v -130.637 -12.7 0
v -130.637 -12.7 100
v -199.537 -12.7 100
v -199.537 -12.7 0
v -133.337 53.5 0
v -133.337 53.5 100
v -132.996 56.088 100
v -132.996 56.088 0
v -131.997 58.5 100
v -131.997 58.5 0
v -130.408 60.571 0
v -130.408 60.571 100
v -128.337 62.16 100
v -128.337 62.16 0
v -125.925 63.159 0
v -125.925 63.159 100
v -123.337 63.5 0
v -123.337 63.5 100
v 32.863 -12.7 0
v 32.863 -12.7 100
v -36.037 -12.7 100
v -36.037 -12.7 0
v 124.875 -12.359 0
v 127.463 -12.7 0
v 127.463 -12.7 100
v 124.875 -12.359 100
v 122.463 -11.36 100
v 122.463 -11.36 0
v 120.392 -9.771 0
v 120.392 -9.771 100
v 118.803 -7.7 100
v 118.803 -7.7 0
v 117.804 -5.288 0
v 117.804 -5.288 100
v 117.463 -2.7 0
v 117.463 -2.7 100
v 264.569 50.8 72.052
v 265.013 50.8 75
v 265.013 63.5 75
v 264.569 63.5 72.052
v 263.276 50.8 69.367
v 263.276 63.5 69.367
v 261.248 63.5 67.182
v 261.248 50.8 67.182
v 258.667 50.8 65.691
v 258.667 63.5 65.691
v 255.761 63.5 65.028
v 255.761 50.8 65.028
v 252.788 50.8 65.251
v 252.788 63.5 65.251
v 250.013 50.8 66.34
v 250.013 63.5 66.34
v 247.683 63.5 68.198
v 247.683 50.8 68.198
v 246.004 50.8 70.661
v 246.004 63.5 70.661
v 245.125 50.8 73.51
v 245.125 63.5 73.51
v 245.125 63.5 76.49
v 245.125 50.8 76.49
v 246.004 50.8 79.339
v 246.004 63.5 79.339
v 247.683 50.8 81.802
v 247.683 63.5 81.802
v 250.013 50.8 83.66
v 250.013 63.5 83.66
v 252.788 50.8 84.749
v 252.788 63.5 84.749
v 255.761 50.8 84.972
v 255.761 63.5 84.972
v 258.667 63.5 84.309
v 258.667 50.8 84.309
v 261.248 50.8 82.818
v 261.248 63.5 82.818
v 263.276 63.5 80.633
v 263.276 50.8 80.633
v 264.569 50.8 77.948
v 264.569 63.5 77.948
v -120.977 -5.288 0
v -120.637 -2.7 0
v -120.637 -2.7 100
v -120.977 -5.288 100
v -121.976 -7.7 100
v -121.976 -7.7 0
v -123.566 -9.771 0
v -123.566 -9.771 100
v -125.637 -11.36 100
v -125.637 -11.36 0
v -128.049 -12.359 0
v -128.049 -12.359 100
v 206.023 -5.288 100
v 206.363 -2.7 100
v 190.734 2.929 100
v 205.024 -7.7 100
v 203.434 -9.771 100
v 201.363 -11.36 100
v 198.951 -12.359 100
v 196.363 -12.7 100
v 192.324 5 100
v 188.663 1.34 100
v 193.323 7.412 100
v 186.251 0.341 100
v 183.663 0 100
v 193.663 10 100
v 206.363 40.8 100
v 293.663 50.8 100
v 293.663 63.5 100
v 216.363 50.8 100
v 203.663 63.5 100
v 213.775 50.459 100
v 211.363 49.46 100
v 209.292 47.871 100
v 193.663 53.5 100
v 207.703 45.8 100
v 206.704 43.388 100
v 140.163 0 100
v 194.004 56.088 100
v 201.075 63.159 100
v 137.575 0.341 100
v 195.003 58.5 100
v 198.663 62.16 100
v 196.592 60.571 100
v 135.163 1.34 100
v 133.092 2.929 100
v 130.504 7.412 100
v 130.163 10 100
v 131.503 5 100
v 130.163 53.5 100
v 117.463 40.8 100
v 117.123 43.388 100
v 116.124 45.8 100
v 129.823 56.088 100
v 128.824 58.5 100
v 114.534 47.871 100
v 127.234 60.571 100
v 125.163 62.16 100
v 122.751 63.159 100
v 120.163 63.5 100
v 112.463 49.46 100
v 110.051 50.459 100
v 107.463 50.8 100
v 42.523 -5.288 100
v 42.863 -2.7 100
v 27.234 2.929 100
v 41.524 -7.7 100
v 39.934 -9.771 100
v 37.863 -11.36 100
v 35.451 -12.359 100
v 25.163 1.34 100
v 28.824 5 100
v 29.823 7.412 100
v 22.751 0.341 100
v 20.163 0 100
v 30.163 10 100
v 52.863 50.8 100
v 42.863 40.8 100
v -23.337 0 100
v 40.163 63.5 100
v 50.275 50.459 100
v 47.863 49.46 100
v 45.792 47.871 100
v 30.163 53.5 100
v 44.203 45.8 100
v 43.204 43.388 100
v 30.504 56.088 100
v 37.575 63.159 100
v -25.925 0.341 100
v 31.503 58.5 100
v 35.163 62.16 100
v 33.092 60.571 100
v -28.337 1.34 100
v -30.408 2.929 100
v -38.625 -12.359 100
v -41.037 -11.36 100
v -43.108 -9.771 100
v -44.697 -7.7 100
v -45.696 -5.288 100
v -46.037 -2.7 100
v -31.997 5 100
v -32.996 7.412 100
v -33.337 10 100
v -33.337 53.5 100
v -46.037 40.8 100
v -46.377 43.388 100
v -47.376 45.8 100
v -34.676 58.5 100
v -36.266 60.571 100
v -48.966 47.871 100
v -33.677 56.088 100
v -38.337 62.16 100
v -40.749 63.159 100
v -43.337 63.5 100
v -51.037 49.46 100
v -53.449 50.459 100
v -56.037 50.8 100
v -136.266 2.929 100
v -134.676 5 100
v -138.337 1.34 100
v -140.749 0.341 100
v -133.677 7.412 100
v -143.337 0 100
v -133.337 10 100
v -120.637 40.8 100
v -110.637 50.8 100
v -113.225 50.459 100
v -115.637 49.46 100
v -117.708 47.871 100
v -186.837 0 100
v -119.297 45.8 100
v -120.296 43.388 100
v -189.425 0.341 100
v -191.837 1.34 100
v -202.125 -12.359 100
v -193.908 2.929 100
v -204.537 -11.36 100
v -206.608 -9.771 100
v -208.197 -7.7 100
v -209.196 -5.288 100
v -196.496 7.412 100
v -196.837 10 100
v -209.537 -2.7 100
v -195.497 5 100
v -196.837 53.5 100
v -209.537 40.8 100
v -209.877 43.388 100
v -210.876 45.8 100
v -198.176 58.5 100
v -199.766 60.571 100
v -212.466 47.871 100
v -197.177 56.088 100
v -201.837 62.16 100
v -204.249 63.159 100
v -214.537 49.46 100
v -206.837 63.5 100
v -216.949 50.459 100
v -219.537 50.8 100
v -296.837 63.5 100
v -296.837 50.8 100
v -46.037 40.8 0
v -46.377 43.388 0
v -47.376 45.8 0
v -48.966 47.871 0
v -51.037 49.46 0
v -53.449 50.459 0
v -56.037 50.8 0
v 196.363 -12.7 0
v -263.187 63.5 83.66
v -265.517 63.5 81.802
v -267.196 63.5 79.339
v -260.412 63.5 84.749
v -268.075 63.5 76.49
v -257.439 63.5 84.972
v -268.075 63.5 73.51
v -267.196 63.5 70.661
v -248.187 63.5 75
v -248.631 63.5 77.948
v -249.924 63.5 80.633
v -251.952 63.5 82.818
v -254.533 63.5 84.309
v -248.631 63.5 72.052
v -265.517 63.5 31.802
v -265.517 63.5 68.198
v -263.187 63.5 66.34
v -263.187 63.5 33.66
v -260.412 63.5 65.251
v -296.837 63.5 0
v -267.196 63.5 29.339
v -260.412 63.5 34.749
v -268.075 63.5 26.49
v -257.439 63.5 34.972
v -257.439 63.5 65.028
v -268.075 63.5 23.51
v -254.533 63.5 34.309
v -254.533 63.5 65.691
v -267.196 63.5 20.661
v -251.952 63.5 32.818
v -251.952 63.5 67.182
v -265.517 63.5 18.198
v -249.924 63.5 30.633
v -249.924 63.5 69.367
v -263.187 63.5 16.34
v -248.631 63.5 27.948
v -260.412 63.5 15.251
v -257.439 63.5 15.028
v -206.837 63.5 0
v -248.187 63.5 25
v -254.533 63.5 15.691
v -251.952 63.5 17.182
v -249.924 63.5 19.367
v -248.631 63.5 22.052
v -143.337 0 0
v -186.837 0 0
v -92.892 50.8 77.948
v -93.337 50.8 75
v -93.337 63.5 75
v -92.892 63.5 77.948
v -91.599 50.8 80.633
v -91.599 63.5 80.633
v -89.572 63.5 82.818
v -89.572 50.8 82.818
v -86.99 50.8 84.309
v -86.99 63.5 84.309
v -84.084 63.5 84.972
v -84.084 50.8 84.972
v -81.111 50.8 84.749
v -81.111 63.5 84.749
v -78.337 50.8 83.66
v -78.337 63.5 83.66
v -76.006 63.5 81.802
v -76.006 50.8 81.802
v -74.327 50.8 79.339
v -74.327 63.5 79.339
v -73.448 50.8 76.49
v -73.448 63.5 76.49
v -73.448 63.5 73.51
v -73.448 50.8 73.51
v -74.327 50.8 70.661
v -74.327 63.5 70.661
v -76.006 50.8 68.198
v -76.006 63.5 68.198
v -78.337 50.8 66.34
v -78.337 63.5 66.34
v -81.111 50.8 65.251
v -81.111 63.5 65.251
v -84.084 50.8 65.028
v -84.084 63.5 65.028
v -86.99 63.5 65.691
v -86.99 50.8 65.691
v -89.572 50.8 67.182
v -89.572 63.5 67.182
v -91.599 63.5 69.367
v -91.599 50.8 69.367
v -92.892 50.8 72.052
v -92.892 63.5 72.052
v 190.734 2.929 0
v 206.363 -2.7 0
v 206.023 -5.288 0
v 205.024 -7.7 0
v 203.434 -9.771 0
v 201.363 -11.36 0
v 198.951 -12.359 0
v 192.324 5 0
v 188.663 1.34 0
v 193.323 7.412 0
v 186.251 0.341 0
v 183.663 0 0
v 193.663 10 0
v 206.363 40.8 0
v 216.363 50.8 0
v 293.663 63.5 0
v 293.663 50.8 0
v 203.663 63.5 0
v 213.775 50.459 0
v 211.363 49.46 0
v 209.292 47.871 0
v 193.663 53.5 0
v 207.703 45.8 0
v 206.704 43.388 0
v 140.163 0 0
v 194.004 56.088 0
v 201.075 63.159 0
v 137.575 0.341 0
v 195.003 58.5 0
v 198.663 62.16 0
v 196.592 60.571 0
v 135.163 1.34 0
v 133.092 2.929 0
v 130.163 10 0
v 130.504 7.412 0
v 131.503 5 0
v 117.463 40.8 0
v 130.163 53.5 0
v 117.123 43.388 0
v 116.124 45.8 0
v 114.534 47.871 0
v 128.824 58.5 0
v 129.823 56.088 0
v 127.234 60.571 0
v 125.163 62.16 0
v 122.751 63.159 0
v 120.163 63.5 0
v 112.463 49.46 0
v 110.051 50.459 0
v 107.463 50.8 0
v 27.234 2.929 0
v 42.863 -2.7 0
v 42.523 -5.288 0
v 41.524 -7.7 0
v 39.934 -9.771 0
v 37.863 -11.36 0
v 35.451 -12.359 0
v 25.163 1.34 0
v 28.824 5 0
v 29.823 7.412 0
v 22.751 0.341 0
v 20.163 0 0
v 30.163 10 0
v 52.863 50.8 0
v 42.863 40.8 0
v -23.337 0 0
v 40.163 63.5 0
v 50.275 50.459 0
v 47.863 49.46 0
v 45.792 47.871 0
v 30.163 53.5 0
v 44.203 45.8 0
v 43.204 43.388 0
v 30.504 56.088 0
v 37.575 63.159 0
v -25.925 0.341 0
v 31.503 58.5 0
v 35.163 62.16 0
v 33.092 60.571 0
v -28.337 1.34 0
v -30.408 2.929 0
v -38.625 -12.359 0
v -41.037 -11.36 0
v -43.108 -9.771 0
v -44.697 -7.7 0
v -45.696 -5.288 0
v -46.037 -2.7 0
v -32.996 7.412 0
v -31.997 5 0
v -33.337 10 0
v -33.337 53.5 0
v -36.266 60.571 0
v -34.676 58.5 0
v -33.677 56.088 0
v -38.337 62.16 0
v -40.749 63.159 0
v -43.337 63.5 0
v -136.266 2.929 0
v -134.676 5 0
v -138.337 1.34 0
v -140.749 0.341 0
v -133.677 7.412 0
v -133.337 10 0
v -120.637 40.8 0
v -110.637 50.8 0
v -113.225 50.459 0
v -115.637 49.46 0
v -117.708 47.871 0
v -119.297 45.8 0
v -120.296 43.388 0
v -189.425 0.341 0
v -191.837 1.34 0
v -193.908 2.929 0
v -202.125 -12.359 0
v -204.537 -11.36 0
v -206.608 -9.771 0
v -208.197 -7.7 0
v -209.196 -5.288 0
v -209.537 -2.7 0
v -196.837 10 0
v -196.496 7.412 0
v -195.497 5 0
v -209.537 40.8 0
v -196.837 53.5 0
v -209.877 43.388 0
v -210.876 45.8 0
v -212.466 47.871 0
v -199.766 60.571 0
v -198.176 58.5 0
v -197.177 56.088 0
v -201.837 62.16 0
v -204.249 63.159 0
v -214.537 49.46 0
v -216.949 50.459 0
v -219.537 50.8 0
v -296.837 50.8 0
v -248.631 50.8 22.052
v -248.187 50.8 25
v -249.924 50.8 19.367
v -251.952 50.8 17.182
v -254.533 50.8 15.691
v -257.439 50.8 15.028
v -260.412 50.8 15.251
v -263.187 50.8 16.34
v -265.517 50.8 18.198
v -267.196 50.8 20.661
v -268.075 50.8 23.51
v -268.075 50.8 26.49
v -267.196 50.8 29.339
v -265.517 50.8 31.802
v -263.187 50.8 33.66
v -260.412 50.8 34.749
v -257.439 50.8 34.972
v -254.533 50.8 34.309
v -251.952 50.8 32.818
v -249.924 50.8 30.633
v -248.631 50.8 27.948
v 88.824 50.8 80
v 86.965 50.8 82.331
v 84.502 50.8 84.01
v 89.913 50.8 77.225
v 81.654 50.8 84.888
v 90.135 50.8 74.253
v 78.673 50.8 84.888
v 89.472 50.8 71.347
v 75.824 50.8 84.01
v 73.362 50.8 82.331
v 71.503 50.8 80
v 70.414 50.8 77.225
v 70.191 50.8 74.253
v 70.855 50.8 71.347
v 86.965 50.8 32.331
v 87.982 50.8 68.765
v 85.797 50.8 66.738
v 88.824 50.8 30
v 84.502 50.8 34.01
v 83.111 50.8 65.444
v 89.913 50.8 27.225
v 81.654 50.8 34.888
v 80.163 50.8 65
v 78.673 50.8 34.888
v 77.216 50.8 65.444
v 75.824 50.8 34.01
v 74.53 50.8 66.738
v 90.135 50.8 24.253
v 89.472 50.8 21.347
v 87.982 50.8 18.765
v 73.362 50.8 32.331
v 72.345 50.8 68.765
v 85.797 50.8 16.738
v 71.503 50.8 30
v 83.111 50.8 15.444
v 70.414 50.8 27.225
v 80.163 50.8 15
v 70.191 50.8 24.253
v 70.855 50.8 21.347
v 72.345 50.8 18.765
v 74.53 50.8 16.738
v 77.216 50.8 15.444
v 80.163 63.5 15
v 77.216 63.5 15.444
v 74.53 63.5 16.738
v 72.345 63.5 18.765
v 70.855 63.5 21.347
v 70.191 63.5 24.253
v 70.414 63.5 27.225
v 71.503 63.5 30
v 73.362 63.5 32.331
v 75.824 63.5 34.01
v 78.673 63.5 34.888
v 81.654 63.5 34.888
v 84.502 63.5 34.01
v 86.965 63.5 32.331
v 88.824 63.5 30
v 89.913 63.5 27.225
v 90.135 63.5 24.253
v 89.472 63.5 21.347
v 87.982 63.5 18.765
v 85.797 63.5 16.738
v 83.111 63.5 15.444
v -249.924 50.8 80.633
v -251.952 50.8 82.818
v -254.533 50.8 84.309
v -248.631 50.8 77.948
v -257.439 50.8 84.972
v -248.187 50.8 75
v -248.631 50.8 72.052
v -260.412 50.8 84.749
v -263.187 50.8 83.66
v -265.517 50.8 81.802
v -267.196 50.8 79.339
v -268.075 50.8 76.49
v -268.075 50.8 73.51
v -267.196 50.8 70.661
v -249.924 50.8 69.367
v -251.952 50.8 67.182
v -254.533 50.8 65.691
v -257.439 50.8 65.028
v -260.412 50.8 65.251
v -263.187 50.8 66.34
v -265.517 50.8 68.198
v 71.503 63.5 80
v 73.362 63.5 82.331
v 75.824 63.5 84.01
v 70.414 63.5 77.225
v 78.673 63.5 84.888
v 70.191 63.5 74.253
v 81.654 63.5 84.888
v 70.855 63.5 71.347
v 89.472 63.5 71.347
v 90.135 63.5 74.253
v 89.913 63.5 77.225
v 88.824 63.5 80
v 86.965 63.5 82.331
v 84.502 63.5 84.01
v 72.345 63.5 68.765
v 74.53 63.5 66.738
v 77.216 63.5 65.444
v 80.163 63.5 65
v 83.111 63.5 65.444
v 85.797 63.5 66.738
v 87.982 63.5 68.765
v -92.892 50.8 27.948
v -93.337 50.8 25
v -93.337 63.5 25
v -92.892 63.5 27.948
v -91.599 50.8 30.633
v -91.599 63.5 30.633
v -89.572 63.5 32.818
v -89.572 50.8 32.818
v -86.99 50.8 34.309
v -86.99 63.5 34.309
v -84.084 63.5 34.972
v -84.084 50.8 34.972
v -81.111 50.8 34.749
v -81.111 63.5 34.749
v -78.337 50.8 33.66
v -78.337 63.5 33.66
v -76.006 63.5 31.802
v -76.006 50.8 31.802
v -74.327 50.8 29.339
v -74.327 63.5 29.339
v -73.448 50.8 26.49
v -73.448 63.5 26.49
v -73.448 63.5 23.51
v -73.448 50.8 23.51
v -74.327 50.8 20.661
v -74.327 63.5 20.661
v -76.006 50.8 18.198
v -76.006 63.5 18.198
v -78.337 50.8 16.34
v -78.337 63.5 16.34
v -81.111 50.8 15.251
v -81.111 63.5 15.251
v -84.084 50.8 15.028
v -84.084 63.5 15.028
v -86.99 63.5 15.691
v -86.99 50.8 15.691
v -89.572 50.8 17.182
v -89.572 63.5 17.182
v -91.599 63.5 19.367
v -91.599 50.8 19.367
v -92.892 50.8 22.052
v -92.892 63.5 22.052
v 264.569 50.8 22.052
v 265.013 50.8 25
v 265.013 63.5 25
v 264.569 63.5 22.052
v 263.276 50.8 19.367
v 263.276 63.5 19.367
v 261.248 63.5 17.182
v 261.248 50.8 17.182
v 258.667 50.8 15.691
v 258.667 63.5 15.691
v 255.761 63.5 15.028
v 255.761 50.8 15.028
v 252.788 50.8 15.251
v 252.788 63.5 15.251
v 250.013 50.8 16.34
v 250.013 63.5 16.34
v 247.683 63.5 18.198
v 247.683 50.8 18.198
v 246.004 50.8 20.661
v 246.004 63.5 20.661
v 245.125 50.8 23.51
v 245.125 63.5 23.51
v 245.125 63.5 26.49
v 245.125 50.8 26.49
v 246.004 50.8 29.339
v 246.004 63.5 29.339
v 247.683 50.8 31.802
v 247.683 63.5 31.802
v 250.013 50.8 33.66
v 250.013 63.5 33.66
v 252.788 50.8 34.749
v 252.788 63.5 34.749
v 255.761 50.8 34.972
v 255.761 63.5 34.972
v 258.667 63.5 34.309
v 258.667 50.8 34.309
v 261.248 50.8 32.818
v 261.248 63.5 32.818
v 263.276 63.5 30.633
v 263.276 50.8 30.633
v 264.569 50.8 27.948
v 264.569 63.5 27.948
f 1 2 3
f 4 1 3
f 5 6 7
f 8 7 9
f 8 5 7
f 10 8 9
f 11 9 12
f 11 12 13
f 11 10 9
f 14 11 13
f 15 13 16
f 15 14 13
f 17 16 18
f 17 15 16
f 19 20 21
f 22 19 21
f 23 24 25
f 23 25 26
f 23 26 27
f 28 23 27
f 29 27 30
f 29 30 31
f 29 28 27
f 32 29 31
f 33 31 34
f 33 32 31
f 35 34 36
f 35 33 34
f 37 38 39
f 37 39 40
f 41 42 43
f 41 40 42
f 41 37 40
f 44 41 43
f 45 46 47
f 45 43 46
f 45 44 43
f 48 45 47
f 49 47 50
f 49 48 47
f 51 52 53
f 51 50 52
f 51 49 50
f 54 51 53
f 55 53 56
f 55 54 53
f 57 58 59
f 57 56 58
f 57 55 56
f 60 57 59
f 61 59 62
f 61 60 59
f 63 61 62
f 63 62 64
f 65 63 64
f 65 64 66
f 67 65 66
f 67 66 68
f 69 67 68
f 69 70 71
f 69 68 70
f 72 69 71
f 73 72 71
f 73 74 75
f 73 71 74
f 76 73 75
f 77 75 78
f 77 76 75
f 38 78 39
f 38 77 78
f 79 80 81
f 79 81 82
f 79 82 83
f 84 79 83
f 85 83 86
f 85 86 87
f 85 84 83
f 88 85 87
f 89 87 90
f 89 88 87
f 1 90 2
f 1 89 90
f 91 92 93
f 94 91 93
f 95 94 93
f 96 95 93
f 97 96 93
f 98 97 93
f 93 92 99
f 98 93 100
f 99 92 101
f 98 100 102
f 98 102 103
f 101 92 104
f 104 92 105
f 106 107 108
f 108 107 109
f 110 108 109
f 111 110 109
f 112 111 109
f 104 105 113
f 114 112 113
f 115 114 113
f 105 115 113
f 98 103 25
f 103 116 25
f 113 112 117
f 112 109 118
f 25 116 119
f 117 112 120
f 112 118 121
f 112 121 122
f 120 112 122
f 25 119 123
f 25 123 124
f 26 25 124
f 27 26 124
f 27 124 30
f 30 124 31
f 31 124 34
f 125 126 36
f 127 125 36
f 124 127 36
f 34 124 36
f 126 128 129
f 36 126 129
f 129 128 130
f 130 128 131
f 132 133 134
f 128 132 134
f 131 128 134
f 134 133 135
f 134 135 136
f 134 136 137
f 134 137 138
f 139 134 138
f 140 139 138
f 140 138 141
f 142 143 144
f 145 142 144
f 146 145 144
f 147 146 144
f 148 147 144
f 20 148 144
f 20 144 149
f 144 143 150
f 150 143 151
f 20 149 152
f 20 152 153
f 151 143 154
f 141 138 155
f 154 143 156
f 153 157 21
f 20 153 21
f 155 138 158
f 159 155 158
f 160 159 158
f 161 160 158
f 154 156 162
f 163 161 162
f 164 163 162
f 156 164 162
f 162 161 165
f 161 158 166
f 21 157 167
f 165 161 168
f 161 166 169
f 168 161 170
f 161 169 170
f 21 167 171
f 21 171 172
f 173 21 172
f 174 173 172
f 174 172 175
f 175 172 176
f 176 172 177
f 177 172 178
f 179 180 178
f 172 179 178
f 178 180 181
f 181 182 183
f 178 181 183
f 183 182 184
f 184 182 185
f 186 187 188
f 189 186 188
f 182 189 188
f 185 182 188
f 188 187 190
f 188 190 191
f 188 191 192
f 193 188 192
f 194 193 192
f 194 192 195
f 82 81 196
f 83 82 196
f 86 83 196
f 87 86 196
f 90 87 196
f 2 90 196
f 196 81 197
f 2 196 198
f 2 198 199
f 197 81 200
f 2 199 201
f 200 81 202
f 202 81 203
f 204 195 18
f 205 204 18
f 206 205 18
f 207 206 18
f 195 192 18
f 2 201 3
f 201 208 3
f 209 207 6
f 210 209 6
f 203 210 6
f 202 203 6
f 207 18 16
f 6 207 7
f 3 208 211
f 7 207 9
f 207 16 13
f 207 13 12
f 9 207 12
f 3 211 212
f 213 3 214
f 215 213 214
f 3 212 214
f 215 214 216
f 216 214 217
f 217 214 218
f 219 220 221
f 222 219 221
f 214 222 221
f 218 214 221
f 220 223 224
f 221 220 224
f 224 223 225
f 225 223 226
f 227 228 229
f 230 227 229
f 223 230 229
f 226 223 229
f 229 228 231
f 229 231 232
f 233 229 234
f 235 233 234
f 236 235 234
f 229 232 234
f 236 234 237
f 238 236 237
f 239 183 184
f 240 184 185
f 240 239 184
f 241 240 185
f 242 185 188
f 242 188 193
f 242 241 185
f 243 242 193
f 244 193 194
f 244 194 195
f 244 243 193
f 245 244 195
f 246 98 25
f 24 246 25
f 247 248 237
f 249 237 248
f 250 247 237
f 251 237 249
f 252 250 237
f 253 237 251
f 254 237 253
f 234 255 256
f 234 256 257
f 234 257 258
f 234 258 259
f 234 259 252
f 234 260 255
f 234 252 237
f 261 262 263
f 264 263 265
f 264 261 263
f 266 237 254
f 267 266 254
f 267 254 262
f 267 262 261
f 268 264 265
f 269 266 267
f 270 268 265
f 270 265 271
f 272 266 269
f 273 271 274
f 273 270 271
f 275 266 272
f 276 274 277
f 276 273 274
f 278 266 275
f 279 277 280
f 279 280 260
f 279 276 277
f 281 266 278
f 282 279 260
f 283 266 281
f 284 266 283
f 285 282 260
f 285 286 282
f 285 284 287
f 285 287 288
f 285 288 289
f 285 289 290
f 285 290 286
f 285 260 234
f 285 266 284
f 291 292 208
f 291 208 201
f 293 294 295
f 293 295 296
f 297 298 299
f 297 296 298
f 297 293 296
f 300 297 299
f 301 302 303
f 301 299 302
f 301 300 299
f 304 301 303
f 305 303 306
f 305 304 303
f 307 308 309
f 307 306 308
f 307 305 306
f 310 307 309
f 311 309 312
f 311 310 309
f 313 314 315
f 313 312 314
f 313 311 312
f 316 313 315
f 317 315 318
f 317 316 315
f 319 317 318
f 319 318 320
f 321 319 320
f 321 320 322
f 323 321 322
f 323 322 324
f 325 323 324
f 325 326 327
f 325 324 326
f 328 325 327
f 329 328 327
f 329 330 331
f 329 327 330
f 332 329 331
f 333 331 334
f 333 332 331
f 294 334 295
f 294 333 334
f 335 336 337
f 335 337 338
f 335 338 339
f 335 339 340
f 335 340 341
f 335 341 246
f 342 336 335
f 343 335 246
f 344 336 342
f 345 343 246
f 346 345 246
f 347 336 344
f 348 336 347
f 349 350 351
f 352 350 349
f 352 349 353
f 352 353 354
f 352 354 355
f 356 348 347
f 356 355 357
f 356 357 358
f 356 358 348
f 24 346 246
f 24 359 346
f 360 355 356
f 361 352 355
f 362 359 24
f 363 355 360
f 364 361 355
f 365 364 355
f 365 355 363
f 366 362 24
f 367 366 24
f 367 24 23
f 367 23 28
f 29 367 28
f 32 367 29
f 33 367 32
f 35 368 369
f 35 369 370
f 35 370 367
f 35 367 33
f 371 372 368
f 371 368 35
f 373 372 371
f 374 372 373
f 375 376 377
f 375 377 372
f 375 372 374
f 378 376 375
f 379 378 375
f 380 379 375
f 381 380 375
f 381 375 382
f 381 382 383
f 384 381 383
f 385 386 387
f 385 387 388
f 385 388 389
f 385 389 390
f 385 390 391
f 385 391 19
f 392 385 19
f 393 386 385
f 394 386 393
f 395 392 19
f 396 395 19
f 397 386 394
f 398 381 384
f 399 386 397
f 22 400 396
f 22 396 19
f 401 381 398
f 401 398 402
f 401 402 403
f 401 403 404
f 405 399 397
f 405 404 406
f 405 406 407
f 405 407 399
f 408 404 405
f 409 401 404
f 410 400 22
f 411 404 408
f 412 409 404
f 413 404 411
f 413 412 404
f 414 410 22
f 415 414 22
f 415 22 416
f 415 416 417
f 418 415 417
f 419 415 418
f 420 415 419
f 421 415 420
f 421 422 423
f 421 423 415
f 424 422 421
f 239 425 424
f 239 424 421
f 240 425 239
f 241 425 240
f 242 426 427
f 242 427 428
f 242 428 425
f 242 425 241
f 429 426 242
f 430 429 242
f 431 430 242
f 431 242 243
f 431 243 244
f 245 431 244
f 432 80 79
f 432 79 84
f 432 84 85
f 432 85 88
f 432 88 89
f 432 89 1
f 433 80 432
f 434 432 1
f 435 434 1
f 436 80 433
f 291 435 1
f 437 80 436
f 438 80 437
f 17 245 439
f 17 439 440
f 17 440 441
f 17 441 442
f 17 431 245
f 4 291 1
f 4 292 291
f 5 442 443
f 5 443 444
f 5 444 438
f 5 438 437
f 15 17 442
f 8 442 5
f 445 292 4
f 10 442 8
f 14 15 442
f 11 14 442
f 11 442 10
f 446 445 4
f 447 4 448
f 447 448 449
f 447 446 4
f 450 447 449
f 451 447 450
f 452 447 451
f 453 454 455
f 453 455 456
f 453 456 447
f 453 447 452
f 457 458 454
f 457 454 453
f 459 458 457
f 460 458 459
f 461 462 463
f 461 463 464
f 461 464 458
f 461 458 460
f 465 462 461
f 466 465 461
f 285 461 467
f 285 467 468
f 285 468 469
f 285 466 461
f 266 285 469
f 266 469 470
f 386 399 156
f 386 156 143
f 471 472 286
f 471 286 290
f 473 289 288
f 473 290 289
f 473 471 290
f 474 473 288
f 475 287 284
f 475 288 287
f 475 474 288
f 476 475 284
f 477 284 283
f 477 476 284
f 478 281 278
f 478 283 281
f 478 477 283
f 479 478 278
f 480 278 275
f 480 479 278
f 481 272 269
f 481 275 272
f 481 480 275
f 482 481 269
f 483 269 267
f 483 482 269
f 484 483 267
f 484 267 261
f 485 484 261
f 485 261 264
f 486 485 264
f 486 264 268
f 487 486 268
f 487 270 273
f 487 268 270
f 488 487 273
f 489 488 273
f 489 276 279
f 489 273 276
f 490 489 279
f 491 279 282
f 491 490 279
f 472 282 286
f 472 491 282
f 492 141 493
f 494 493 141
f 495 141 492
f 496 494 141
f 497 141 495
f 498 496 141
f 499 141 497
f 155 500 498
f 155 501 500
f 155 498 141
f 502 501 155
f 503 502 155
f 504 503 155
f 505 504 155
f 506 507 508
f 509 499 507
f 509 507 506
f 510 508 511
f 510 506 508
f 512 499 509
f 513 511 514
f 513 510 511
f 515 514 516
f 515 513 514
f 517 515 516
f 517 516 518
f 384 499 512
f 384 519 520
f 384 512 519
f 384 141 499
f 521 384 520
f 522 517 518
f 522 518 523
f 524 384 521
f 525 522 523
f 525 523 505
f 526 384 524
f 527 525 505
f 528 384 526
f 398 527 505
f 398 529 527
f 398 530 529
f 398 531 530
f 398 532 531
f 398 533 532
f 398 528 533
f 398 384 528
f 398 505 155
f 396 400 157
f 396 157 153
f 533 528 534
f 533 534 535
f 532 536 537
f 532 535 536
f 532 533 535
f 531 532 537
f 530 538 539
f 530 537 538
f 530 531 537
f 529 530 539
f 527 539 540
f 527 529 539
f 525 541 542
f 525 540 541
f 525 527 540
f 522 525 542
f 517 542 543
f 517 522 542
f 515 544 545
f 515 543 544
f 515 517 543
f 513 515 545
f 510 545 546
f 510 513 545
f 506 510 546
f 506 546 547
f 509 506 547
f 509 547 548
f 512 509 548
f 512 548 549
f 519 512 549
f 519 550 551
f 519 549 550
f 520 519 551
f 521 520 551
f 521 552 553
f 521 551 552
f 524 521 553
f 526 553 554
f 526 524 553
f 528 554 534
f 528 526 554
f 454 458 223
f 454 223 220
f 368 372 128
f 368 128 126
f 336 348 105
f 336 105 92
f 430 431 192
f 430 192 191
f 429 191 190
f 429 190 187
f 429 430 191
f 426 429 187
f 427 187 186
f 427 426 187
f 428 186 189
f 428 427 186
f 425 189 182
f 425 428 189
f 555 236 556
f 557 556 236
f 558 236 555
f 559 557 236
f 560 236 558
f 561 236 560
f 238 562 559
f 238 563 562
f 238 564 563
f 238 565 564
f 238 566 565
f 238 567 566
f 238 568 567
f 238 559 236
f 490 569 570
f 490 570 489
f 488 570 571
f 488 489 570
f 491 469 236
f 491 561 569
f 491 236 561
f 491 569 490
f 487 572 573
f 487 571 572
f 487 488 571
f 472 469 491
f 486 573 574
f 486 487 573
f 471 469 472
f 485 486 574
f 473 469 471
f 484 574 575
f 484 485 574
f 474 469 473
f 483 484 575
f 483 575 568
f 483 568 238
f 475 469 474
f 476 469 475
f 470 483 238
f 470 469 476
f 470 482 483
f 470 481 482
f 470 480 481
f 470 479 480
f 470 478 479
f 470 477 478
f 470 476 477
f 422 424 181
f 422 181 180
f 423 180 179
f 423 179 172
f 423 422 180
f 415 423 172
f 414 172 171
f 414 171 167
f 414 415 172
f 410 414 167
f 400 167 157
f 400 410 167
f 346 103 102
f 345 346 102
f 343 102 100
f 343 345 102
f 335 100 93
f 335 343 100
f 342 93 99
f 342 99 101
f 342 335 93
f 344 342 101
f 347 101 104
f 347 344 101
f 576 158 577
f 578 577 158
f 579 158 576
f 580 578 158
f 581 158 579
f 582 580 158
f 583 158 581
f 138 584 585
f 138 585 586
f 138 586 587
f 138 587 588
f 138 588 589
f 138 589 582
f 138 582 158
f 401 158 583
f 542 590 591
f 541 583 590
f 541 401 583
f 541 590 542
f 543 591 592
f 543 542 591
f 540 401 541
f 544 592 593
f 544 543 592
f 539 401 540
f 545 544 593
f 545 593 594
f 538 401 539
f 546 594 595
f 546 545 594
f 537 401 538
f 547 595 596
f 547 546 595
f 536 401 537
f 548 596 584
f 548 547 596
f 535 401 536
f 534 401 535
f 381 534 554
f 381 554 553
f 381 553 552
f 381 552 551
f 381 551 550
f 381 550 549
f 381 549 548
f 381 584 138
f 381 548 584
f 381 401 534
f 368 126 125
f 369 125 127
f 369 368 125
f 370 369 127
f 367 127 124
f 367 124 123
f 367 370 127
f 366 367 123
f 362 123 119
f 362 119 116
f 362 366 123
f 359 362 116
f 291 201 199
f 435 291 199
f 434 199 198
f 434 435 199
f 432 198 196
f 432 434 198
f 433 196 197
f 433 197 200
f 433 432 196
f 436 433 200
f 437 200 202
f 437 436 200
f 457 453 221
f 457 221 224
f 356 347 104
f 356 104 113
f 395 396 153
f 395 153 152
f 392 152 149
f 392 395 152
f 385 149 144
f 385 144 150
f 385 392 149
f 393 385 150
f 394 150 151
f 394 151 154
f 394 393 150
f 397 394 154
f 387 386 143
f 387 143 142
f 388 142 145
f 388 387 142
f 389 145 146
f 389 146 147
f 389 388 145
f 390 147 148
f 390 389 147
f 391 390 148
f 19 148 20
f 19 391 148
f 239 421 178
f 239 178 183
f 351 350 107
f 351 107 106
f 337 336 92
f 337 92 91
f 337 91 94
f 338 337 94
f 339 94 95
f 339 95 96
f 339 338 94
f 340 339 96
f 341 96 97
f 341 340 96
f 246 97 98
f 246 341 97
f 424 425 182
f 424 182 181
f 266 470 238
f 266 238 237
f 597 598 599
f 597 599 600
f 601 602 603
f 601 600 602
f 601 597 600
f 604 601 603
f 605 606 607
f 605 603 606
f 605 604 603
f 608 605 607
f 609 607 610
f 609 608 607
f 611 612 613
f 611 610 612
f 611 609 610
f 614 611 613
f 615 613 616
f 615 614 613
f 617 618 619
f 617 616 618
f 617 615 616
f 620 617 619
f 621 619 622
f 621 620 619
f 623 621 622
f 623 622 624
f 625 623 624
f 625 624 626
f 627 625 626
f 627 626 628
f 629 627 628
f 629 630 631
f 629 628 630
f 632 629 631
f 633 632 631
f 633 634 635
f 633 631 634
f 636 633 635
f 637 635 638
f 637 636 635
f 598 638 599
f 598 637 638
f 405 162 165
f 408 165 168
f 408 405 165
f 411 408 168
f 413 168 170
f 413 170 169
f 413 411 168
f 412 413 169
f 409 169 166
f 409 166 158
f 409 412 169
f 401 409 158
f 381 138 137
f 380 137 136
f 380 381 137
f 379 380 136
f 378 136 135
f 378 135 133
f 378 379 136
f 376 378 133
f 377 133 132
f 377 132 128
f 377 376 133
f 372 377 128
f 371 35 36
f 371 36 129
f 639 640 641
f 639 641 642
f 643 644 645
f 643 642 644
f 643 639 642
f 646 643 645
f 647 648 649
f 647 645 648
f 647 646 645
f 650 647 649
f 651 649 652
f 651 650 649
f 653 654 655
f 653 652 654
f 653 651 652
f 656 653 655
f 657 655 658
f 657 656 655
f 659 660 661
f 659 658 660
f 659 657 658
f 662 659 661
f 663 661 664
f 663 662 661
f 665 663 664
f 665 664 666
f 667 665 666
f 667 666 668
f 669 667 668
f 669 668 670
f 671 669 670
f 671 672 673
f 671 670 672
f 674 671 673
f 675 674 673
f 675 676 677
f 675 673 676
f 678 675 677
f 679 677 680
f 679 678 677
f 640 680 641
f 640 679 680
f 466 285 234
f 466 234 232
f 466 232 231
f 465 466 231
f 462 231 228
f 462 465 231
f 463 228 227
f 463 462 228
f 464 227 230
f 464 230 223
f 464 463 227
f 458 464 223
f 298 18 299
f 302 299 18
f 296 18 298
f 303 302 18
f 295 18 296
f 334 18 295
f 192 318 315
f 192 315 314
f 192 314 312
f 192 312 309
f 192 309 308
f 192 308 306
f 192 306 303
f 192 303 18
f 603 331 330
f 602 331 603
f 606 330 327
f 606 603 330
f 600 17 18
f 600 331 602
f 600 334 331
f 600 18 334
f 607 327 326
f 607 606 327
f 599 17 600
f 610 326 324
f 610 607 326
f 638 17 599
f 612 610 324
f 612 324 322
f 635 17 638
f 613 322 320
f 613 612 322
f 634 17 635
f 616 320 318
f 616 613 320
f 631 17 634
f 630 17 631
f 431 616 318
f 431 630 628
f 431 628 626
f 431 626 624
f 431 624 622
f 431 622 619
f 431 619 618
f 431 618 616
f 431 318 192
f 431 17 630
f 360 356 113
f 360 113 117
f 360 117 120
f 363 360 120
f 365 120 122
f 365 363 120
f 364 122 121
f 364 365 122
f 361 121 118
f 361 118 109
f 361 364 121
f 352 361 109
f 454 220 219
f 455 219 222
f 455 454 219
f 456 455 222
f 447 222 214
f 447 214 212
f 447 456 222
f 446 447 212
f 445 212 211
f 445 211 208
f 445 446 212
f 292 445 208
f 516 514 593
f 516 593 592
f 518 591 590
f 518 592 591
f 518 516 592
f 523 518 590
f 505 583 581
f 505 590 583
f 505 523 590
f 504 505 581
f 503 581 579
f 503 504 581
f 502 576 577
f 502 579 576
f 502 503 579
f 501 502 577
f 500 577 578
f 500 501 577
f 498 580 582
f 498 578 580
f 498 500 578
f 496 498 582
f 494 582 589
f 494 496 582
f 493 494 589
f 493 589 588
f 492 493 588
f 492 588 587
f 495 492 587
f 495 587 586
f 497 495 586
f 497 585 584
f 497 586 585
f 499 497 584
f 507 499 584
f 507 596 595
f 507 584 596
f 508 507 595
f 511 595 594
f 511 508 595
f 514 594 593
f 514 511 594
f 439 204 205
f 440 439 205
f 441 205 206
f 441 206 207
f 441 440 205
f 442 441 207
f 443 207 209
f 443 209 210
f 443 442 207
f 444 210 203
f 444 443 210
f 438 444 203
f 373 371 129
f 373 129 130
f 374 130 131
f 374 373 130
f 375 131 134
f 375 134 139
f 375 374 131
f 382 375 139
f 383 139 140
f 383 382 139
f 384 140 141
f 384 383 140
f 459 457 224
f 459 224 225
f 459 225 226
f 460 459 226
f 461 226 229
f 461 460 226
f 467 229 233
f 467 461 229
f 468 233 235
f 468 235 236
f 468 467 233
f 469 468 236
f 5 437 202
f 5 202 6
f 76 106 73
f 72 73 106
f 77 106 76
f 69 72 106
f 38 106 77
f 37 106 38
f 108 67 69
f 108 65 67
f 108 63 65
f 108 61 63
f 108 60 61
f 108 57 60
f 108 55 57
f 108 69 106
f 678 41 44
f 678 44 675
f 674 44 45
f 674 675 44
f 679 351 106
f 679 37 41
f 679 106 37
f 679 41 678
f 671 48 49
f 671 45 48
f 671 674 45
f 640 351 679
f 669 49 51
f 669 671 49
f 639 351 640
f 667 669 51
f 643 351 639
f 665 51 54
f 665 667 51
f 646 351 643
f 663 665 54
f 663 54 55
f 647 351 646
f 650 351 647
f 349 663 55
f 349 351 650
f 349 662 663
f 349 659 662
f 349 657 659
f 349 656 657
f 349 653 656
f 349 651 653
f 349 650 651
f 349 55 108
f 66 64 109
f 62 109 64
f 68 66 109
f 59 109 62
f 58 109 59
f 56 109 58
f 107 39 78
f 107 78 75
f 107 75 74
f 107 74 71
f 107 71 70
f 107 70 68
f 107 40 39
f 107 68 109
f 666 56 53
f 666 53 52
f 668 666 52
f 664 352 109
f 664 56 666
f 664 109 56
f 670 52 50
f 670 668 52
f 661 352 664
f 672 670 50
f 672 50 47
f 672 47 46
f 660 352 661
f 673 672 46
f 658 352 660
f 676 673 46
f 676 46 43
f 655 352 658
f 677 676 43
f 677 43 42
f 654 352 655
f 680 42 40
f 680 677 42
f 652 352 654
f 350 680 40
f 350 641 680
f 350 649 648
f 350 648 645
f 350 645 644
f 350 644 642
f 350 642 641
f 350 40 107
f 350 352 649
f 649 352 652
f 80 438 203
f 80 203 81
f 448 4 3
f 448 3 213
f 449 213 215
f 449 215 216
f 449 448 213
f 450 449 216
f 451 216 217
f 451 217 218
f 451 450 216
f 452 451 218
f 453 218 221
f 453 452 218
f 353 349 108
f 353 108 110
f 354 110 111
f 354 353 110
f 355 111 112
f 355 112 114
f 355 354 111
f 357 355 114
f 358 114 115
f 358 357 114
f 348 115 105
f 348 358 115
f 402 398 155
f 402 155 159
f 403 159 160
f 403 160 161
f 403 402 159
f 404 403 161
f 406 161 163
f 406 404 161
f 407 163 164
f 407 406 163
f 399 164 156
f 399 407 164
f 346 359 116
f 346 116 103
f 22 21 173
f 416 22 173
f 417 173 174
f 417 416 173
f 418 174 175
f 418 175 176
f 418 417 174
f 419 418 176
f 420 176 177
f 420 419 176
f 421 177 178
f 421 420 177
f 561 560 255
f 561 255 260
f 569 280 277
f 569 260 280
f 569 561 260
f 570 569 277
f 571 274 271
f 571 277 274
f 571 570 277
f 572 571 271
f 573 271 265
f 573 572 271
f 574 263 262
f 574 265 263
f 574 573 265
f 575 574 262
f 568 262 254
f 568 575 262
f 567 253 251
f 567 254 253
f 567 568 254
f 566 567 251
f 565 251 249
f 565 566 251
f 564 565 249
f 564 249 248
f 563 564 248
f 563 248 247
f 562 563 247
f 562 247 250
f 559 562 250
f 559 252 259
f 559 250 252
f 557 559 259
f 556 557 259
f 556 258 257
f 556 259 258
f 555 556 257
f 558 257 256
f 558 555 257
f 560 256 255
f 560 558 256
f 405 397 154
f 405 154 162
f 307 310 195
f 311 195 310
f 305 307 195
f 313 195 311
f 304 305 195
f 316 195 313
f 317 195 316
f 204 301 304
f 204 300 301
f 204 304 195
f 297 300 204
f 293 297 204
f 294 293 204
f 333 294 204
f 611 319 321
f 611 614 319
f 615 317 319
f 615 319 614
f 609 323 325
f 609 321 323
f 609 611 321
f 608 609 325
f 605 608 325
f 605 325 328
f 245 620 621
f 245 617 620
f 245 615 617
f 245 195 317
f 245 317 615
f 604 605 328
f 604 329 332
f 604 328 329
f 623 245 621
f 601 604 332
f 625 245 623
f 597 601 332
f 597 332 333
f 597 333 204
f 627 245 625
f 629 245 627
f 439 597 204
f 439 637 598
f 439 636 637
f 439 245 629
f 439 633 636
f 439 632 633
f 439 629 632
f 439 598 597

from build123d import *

# Parameters (mm, degrees)
BOSS_EXTRUDE1_DEPTH = 100
SKETCH2_R           = 10
CUT_EXTRUDE1_DEPTH  = 140.26


with BuildPart() as part:
    # Sketch1 → Boss-Extrude1 (new body)
    with BuildSketch(Plane.XY):
        with BuildLine():
            Line((-23.336691171, 0), (20.163308829, 0))
            ThreePointArc((20.163308829, 0), (27.234376641, 2.928932188), (30.163308829, 10))
            Line((30.163308829, 10), (30.163308829, 53.5))
            ThreePointArc((30.163308829, 53.5), (33.092241017, 60.571067812), (40.163308829, 63.5))
            Line((40.163308829, 63.5), (80.163308829, 63.5))
            Line((80.163308829, 63.5), (120.163308829, 63.5))
            ThreePointArc((120.163308829, 63.5), (127.234376641, 60.571067812), (130.163308829, 53.5))
            Line((130.163308829, 53.5), (130.163308829, 10))
            ThreePointArc((130.163308829, 10), (133.092241017, 2.928932188), (140.163308829, 0))
            Line((140.163308829, 0), (183.663308829, 0))
            ThreePointArc((183.663308829, 0), (190.734376641, 2.928932188), (193.663308829, 10))
            Line((193.663308829, 10), (193.663308829, 53.5))
            ThreePointArc((193.663308829, 53.5), (196.592241017, 60.571067812), (203.663308829, 63.5))
            Line((203.663308829, 63.5), (293.663308829, 63.5))
            Line((293.663308829, 63.5), (293.663308829, 50.8))
            Line((293.663308829, 50.8), (216.363308829, 50.8))
            ThreePointArc((216.363308829, 50.8), (209.292241017, 47.871067812), (206.363308829, 40.8))
            Line((206.363308829, 40.8), (206.363308829, -2.7))
            ThreePointArc((206.363308829, -2.7), (203.434376641, -9.771067812), (196.363308829, -12.7))
            Line((196.363308829, -12.7), (127.463308829, -12.7))
            ThreePointArc((127.463308829, -12.7), (120.392241017, -9.771067812), (117.463308829, -2.7))
            Line((117.463308829, -2.7), (117.463308829, 40.8))
            ThreePointArc((117.463308829, 40.8), (114.534376641, 47.871067812), (107.463308829, 50.8))
            Line((107.463308829, 50.8), (80.163308829, 50.8))
            Line((80.163308829, 50.8), (52.863308829, 50.8))
            ThreePointArc((52.863308829, 50.8), (45.792241017, 47.871067812), (42.863308829, 40.8))
            Line((42.863308829, 40.8), (42.863308829, -2.7))
            ThreePointArc((42.863308829, -2.7), (39.934376641, -9.771067812), (32.863308829, -12.7))
            Line((32.863308829, -12.7), (-36.036691171, -12.7))
            ThreePointArc((-36.036691171, -12.7), (-43.107758983, -9.771067812), (-46.036691171, -2.7))
            Line((-46.036691171, -2.7), (-46.036691171, 40.8))
            ThreePointArc((-46.036691171, 40.8), (-48.965623359, 47.871067812), (-56.036691171, 50.8))
            Line((-56.036691171, 50.8), (-83.336691171, 50.8))
            Line((-83.336691171, 50.8), (-110.636691171, 50.8))
            ThreePointArc((-110.636691171, 50.8), (-117.707758983, 47.871067812), (-120.636691171, 40.8))
            Line((-120.636691171, 40.8), (-120.636691171, -2.7))
            ThreePointArc((-120.636691171, -2.7), (-123.565623359, -9.771067812), (-130.636691171, -12.7))
            Line((-130.636691171, -12.7), (-199.536691171, -12.7))
            ThreePointArc((-199.536691171, -12.7), (-206.607758983, -9.771067812), (-209.536691171, -2.7))
            Line((-209.536691171, -2.7), (-209.536691171, 40.8))
            ThreePointArc((-209.536691171, 40.8), (-212.465623359, 47.871067812), (-219.536691171, 50.8))
            Line((-219.536691171, 50.8), (-296.836691171, 50.8))
            Line((-296.836691171, 50.8), (-296.836691171, 63.5))
            Line((-296.836691171, 63.5), (-206.836691171, 63.5))
            ThreePointArc((-206.836691171, 63.5), (-199.765623359, 60.571067812), (-196.836691171, 53.5))
            Line((-196.836691171, 53.5), (-196.836691171, 10))
            ThreePointArc((-196.836691171, 10), (-193.907758983, 2.928932188), (-186.836691171, 0))
            Line((-186.836691171, 0), (-143.336691171, 0))
            ThreePointArc((-143.336691171, 0), (-136.265623359, 2.928932188), (-133.336691171, 10))
            Line((-133.336691171, 10), (-133.336691171, 53.5))
            ThreePointArc((-133.336691171, 53.5), (-130.407758983, 60.571067812), (-123.336691171, 63.5))
            Line((-123.336691171, 63.5), (-83.336691171, 63.5))
            Line((-83.336691171, 63.5), (-43.336691171, 63.5))
            ThreePointArc((-43.336691171, 63.5), (-36.265623359, 60.571067812), (-33.336691171, 53.5))
            Line((-33.336691171, 53.5), (-33.336691171, 10))
            ThreePointArc((-33.336691171, 10), (-30.407758983, 2.928932188), (-23.336691171, 0))
        make_face()
    extrude(amount=BOSS_EXTRUDE1_DEPTH)

    # Sketch2 → Cut-Extrude1 (cut)
    with BuildSketch(Plane(origin=(0, 0, 0), x_dir=(1, 0, 0), z_dir=(0, 1, 0))):
        with Locations((-258.186691171, -75)):
            Circle(SKETCH2_R)
        with Locations((-258.186691171, -25)):
            Circle(SKETCH2_R)
        with Locations(Location((-83.336691171, -75, 0), (0, 0, 180))):
            Circle(SKETCH2_R)
        with Locations(Location((-83.336691171, -25, 0), (0, 0, 180))):
            Circle(SKETCH2_R)
        with Locations(Location((80.163308829, -75, 0), (0, 0, 90))):
            Circle(SKETCH2_R)
        with Locations(Location((80.163308829, -25, 0), (0, 0, 90))):
            Circle(SKETCH2_R)
        with Locations((255.013308829, -75)):
            Circle(SKETCH2_R)
        with Locations((255.013308829, -25)):
            Circle(SKETCH2_R)
    extrude(amount=CUT_EXTRUDE1_DEPTH, mode=Mode.SUBTRACT)


solid = part.part
